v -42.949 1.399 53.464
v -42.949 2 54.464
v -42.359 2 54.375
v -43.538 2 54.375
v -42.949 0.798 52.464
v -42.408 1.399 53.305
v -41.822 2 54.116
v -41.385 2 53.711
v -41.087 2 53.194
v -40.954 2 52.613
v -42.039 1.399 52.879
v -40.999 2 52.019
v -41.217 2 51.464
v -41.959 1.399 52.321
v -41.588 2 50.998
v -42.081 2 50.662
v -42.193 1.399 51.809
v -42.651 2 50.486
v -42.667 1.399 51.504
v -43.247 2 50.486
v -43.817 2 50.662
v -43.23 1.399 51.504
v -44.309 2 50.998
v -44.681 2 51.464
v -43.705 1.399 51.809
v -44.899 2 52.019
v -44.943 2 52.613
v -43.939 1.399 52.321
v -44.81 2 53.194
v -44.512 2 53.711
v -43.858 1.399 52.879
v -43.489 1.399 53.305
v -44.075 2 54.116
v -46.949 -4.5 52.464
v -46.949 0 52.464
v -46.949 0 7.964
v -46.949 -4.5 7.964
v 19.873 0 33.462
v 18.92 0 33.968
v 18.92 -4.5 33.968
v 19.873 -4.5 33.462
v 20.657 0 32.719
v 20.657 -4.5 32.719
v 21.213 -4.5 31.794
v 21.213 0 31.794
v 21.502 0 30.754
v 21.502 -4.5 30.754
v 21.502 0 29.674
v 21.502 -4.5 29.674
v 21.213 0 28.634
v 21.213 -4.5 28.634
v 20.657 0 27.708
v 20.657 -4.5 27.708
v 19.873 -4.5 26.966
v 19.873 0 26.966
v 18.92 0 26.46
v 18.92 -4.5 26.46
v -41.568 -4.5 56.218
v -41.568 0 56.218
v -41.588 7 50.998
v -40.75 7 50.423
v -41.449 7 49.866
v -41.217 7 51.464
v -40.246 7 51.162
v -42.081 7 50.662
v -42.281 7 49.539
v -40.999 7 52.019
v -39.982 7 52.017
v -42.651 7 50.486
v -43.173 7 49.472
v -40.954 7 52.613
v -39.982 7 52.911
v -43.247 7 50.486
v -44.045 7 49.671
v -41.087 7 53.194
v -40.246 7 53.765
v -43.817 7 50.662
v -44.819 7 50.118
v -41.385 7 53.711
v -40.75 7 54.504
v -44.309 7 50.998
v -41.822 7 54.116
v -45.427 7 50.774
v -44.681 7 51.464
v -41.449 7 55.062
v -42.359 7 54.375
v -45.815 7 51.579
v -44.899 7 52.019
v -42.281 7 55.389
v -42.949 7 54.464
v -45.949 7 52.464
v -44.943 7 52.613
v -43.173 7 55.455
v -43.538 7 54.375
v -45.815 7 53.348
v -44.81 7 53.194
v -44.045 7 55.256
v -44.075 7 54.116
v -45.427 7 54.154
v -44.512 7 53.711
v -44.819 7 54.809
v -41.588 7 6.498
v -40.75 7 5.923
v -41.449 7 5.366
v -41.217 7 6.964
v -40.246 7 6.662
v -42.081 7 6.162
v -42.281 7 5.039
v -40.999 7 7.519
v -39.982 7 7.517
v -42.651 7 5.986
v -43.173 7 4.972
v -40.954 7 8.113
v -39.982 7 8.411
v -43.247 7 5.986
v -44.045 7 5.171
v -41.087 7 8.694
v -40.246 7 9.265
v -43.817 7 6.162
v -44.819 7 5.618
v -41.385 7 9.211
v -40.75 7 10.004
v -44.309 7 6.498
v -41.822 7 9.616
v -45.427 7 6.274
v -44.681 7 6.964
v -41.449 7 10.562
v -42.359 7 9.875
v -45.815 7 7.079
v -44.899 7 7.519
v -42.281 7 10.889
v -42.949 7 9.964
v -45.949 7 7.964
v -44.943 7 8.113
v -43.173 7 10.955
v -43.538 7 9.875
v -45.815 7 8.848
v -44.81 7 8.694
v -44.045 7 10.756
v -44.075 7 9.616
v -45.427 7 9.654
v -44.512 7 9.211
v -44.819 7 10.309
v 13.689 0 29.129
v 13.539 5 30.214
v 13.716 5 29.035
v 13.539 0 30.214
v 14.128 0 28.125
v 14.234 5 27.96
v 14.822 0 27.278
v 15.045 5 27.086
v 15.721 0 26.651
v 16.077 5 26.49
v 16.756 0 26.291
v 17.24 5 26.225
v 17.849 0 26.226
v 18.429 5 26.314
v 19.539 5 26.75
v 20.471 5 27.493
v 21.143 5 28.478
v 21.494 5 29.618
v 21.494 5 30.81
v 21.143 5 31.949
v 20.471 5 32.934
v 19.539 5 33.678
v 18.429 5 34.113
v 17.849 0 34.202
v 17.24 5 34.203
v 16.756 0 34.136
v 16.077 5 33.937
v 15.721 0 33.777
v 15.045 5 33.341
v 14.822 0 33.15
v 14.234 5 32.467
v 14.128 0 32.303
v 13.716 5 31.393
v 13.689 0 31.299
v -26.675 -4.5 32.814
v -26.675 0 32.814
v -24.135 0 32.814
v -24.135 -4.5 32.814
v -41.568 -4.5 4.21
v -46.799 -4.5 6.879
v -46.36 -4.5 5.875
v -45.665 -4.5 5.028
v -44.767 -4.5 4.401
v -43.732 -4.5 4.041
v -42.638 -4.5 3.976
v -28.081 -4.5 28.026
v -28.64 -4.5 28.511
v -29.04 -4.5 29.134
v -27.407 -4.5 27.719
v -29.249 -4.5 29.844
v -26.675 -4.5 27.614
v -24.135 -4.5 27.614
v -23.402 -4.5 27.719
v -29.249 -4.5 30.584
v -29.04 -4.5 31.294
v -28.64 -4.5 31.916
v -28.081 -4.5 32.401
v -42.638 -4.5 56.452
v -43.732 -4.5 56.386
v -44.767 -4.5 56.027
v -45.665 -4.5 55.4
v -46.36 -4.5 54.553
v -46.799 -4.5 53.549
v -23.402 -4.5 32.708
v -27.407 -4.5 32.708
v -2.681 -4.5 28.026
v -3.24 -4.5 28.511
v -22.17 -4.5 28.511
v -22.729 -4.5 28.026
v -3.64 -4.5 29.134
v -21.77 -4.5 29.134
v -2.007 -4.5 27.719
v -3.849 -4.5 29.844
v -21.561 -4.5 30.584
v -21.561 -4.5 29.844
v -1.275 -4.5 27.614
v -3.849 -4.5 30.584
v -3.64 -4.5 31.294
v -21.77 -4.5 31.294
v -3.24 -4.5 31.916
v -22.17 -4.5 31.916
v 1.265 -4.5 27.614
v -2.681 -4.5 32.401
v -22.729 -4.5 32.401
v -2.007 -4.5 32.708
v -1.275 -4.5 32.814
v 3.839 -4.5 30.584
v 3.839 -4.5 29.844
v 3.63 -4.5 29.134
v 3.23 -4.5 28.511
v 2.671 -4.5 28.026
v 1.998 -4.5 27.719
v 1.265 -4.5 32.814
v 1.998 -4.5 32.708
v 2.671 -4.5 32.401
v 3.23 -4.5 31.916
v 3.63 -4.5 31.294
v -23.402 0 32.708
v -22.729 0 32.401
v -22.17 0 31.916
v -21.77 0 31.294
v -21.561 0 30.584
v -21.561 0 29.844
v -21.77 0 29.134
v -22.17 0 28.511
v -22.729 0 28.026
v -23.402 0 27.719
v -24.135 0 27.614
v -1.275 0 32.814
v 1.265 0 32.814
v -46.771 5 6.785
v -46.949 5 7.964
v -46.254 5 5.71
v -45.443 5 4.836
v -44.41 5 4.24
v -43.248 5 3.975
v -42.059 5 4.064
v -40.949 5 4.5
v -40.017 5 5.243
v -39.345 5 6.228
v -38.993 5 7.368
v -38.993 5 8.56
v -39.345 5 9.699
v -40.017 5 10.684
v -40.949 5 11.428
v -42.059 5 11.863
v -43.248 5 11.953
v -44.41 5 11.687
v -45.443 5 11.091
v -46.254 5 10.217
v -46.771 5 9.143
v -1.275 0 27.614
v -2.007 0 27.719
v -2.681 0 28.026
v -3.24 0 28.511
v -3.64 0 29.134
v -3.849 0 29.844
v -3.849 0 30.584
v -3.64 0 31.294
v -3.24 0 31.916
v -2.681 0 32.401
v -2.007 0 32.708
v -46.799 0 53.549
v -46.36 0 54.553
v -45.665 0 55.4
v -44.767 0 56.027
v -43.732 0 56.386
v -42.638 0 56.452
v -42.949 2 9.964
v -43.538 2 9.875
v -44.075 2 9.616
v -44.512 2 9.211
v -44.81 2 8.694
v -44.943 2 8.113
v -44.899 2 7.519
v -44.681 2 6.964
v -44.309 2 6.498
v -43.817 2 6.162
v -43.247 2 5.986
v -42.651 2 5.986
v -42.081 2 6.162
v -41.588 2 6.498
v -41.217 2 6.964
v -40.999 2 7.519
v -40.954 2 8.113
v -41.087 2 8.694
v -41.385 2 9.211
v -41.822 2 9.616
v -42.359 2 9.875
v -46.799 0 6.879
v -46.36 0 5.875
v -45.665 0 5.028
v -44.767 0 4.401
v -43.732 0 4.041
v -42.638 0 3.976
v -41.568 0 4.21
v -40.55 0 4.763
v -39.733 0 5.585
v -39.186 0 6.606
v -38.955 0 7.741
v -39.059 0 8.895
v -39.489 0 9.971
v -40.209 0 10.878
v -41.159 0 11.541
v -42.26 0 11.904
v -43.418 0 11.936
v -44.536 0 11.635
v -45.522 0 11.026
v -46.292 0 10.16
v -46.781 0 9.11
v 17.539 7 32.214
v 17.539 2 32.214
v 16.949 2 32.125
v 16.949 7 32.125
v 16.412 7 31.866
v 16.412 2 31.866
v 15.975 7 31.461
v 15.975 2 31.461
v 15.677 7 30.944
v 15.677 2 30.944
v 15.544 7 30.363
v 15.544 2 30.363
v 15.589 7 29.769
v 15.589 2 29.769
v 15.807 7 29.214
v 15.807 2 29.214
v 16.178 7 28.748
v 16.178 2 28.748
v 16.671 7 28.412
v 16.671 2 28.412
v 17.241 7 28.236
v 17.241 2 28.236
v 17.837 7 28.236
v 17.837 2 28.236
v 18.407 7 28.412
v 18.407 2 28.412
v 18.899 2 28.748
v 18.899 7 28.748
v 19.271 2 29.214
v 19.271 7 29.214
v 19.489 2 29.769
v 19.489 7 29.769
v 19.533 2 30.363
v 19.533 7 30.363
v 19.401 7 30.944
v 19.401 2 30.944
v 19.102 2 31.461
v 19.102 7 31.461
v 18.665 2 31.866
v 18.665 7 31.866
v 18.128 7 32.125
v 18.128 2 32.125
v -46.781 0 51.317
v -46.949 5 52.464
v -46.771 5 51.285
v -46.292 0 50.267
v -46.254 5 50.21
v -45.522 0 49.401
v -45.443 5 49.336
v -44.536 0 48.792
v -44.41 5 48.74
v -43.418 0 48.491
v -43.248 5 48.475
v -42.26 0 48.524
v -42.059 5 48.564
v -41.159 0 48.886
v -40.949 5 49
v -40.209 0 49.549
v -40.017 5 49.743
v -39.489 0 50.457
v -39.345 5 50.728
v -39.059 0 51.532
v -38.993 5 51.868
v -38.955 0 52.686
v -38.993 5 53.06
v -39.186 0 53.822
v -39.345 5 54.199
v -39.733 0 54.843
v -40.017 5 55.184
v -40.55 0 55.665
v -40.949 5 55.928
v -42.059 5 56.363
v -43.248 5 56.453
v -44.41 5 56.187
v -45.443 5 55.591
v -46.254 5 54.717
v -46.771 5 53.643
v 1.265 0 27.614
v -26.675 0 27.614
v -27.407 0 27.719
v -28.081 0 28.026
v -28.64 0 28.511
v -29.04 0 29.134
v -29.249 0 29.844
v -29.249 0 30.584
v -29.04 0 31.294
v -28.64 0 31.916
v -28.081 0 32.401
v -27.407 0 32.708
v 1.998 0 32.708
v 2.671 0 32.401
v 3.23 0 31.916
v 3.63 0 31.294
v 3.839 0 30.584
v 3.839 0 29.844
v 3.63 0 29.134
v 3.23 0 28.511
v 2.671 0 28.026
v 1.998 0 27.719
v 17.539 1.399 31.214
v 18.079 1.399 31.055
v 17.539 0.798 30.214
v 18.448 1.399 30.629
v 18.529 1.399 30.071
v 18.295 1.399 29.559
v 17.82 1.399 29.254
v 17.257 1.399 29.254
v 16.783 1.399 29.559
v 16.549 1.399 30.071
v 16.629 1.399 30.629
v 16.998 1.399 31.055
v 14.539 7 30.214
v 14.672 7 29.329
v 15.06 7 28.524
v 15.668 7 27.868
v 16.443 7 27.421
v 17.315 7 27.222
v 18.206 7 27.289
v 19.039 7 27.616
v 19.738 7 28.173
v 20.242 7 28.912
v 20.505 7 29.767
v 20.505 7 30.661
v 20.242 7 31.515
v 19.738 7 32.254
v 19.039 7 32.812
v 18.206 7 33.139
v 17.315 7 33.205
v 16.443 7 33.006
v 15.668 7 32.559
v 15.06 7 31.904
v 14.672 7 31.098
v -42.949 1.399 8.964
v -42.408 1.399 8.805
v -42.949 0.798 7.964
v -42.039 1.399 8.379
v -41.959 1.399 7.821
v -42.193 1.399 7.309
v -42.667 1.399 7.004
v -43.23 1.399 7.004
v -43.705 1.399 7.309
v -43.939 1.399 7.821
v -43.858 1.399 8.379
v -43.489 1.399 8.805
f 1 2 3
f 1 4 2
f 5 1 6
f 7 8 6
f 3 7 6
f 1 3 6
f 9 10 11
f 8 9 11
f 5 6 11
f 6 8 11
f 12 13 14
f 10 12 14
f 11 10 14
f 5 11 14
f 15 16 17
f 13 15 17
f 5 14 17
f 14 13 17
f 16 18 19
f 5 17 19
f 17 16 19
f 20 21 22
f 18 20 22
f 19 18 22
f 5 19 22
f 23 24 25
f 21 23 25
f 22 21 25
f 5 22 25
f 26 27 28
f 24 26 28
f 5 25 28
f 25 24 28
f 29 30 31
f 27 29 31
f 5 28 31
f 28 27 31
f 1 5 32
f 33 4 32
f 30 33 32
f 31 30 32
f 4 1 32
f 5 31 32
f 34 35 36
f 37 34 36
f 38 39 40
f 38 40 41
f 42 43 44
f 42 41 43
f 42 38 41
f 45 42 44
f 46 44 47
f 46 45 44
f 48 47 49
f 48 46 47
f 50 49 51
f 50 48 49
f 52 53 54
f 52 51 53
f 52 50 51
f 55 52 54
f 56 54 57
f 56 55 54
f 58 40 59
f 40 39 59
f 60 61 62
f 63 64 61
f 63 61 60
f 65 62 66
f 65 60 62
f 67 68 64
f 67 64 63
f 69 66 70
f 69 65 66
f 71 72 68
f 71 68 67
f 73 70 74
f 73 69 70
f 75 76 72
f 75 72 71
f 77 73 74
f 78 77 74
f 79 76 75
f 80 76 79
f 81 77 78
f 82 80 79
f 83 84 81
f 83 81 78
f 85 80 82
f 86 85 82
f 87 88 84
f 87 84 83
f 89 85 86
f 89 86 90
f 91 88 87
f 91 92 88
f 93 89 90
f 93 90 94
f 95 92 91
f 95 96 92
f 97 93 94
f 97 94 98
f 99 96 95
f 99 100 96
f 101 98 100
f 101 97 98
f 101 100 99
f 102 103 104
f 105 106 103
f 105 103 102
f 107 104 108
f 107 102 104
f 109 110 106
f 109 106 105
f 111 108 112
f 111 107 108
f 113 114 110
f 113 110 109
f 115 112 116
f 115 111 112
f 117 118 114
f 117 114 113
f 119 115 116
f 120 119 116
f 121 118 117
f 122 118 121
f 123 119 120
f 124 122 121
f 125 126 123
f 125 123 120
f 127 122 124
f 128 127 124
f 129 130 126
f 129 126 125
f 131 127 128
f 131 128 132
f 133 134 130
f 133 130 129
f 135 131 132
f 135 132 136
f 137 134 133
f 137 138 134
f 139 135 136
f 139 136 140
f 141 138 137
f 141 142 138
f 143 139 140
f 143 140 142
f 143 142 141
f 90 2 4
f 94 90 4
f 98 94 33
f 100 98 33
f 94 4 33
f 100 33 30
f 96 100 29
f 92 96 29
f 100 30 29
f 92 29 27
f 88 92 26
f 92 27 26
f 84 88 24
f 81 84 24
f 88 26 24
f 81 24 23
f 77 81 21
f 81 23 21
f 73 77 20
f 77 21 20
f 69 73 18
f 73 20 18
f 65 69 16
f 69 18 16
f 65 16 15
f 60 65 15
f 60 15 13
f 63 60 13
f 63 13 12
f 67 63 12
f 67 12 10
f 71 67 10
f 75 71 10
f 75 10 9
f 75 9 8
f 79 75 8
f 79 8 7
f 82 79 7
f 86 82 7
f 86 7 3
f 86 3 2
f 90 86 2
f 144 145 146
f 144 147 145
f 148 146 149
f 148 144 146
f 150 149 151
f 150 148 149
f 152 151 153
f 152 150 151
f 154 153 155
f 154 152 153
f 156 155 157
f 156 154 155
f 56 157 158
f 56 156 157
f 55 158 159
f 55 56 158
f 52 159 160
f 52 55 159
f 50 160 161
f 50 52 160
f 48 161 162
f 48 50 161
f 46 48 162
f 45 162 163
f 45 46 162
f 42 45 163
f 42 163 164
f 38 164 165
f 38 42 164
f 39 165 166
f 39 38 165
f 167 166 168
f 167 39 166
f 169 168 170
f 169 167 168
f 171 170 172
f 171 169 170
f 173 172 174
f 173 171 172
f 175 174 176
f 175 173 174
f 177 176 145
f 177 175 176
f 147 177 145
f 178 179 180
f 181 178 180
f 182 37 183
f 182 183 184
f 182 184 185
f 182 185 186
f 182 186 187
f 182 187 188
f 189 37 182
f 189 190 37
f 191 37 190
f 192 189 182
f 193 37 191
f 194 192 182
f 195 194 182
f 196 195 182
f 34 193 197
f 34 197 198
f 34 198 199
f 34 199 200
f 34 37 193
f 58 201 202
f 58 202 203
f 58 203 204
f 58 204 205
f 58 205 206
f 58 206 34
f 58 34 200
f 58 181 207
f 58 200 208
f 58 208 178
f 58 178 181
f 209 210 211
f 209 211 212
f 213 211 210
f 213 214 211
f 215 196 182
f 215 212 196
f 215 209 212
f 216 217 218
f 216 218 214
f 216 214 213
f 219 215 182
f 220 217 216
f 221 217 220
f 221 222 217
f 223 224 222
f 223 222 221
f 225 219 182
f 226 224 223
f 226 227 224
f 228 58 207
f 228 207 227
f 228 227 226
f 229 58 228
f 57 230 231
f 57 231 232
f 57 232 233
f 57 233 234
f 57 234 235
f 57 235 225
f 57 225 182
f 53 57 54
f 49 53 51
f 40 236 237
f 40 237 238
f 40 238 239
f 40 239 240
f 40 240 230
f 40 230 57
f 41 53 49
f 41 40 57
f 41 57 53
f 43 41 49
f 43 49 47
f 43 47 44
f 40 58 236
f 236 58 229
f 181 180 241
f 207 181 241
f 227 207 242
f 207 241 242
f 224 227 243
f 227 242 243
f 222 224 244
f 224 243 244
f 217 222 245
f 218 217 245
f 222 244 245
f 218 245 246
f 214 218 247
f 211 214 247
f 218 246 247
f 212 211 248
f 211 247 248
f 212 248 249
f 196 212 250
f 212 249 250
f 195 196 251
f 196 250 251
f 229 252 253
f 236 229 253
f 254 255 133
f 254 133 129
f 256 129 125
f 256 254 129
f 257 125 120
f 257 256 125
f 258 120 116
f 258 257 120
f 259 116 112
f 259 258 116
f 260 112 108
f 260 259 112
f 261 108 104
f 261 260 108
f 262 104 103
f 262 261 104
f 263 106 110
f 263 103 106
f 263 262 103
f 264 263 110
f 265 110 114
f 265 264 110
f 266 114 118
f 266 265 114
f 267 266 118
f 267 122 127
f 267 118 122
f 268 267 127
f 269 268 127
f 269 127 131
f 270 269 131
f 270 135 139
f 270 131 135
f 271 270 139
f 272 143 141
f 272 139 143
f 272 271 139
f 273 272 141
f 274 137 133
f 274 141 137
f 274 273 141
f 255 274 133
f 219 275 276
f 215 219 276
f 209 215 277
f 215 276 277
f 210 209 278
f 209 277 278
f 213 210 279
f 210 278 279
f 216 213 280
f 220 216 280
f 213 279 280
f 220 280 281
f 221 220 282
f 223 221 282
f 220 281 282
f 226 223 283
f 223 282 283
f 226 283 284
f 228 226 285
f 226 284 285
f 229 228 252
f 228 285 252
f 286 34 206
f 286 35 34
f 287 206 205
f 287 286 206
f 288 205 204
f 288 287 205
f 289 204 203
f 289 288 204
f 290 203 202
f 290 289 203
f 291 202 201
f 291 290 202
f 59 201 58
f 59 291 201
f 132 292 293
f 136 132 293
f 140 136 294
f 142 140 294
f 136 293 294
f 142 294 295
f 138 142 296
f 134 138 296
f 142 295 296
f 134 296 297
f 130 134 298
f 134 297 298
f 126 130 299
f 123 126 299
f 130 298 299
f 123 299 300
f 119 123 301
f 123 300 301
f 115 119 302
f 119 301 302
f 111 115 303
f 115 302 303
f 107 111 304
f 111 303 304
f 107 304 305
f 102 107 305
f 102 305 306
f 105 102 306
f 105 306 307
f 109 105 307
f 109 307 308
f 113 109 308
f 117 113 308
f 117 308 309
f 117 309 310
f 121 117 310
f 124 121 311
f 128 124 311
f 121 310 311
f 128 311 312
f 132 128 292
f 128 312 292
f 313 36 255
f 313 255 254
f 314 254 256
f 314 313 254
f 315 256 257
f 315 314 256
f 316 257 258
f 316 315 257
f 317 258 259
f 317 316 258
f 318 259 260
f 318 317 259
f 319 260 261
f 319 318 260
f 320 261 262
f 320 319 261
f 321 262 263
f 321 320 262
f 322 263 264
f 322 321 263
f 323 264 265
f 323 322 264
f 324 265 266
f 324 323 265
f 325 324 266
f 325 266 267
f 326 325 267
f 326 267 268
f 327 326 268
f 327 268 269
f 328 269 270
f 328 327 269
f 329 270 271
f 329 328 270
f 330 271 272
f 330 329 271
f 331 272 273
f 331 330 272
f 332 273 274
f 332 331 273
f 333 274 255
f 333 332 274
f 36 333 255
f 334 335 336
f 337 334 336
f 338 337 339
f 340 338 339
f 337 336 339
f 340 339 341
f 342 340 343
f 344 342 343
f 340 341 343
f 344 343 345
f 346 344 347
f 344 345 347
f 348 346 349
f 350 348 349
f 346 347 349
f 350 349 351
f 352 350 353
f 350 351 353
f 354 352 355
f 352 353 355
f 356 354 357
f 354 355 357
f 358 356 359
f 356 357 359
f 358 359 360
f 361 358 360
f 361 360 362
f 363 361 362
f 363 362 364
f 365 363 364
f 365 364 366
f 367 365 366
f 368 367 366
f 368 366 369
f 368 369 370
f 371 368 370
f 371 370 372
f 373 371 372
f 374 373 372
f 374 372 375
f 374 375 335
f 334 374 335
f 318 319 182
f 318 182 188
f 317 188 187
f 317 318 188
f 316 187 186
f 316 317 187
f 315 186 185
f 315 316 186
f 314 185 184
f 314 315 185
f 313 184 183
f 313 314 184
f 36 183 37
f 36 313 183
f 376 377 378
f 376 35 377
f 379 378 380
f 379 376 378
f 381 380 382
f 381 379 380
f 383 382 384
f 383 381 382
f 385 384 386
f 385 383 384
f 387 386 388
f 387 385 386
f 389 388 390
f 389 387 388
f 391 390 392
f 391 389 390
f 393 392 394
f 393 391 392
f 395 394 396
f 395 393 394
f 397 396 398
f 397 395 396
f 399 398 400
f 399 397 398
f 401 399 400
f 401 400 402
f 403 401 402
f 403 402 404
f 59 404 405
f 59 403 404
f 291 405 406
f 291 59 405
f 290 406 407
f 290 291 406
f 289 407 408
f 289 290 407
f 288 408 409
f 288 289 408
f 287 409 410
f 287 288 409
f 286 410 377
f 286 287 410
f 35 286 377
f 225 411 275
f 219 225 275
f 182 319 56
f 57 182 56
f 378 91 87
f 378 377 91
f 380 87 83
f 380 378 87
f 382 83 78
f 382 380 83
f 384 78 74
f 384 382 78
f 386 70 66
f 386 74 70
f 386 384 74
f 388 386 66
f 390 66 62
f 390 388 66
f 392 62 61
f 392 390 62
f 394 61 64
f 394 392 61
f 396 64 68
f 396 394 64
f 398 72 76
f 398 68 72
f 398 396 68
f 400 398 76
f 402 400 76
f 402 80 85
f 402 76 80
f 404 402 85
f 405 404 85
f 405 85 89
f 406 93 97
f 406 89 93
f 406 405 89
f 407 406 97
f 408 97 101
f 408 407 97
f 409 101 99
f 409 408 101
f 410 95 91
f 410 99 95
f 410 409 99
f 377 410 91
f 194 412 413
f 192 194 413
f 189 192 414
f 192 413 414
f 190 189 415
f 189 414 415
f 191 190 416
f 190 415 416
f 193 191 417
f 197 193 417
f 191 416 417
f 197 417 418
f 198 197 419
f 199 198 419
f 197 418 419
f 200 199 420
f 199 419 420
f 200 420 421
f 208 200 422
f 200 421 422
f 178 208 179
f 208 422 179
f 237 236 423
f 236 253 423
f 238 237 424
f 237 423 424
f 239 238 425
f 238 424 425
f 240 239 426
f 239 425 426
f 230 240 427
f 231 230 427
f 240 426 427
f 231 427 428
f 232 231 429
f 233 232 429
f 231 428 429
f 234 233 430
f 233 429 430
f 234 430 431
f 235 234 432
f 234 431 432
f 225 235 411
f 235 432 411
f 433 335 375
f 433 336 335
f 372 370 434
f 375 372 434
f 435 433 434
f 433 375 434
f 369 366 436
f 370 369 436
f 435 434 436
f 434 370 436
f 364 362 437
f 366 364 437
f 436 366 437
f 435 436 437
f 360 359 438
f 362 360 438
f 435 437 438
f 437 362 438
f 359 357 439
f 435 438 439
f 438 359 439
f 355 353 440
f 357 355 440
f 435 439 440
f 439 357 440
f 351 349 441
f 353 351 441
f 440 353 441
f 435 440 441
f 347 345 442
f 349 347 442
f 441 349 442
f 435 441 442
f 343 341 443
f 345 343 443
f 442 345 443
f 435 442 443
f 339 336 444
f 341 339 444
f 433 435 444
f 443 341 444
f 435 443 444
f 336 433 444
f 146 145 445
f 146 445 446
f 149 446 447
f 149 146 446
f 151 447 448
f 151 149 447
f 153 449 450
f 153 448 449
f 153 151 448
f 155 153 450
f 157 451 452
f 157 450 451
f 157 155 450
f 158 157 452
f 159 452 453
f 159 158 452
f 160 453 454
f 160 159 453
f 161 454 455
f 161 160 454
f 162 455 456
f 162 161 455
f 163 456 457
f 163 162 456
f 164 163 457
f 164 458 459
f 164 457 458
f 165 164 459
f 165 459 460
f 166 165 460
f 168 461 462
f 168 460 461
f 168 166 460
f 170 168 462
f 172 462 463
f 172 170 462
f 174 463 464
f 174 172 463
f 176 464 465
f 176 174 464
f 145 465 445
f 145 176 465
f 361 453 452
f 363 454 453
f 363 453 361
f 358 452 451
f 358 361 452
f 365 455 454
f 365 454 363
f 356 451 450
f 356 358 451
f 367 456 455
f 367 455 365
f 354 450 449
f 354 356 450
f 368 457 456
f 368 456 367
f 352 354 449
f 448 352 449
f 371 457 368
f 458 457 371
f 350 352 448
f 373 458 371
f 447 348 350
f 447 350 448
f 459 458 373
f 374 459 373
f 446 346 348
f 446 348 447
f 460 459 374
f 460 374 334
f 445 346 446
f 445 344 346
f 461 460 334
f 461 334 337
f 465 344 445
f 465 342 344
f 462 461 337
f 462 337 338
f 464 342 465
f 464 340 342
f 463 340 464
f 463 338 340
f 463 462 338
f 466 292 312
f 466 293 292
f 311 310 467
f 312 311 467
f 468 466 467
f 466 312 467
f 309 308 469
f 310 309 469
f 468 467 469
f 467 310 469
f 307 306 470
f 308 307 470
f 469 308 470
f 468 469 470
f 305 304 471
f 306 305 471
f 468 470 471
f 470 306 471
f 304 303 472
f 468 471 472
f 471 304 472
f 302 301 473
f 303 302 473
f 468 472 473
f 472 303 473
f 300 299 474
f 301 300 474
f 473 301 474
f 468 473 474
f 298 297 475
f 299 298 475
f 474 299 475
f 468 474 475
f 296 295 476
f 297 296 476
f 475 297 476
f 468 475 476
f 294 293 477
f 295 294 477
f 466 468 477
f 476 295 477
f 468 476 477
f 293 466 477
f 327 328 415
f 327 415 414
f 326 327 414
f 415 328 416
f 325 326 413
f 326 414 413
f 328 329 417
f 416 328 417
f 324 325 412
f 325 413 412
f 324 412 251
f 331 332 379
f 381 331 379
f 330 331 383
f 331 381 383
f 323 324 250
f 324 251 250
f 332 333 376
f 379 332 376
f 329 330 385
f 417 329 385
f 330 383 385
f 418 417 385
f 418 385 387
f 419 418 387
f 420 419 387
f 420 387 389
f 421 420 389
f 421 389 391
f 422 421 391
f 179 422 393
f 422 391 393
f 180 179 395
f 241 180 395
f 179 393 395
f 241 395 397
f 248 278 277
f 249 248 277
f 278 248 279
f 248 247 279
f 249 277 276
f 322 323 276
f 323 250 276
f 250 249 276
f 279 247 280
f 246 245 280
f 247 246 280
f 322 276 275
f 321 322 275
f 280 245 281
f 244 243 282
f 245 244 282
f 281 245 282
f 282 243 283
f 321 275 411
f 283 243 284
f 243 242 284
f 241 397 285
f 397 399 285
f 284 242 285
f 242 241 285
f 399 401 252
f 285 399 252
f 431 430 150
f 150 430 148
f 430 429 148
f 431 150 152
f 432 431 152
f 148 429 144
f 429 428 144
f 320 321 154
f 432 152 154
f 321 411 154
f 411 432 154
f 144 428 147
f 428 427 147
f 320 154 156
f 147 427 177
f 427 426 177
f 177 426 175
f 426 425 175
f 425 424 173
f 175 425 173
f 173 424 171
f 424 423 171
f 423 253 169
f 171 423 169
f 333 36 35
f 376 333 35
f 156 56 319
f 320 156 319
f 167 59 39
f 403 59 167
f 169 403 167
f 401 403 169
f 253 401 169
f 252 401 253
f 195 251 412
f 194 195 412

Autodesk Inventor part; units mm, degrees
ref_plane "YZ Plane" through (0, 0, 0) normal (1, 0, 0) x (0, 1, 0)
ref_plane "XZ Plane" through (0, 0, 0) normal (0, 1, 0) x (-1, 0, 0)
ref_plane "XY Plane" through (0, 0, 0) normal (0, 0, 1) x (1, 0, 0)
sketch "Connector Hole Layout" plane through (0, 0, 0) normal (0, 1, 0) x (-1, 0, 0)
  circle A0 centre (42.948752, 7.963756) radius 1.6 construction
  circle A1 centre (-17.538767, 30.213756) radius 1.6 construction
  circle A2 centre (42.948752, 52.463756) radius 1.6 construction
  line L0 (42.948752, 7.963756) -> (42.948752, 52.463756) construction
  line L1 (41.447122, 51.91139) -> (-16.037138, 30.766122) construction
  point P0 (42.948752, 30.213756)
  dimension "d0" = 3.2
  dimension "d22" = 44.5
  dimension "d23" = 61.25
sketch "Sketch8" plane through (0, 0, 0) normal (0, 1, 0) x (-1, 0, 0)
  circle A0 centre (42.948752, 7.963756) radius 1.6 construction
  circle A1 centre (42.948752, 52.463756) radius 1.6 construction
  circle A2 centre (-17.538767, 30.213756) radius 1.6 construction
  circle A3 centre (42.948752, 7.963756) radius 4
  point P0 (0, 0)
  dimension "d51" = 8
sketch "Sketch8 outline for Extrusion5" plane through (0, 0, 0) normal (0, 1, 0) x (-1, 0, 0)
  circle A0 centre (42.948752, 7.963756) radius 4
extrude "Extrusion5" add sketch "Sketch8 outline for Extrusion5" along normal blind 7
sketch "Sketch9" plane through (-42.948752, 7, 7.963756) normal (0, 1, 0) x (1, 0, 0)
  point P0 (42.948752, 7.963756)
  point P1 (0, 0)
hole "Hole2" at (-42.948752, 7, 7.963756) direction (0, -1, 0) diameter 4 depth 5 tip angle 118
chamfer "Chamfer3" distance 1 distance2 2 1 edges at (-38.9488, 7, 7.9638) measured on face at (-46.2385, 7, 7.5643)
pattern_sketch "Sketch Driven Pattern1" from (-42.948752, 0, 7.963756) copies at (-42.948752, 0, 52.463756) at (17.538767, 0, 30.213756)
sketch "Sketch10" plane through (-42.948752, 0, 52.463756) normal (0, -1, 0) x (1, 0, 0)
  circle A0 centre (0, 0) radius 4
  line L0 (1.380915, 3.754074) -> (61.868435, -18.495926)
  circle A1 centre (60.487519, -22.25) radius 4
  line L1 (61.868435, -26.004074) -> (1.380915, -48.254074)
  circle A2 centre (0, -44.5) radius 4
  line L2 (-4, -44.5) -> (-4, 0)
  circle A3 centre (0, 0) radius 4
  circle A4 centre (0, -44.5) radius 4
  point P0 (42.948752, -52.463756)
sketch "Sketch10 outline for Extrusion6" plane through (-42.948752, 0, 52.463756) normal (0, -1, 0) x (1, 0, 0)
  line L0 (-4, 0) -> (-4, -44.5)
  arc A0 (1.380915, 3.754074) -> (-4, 0) centre (0, 0) ccw
  line L1 (61.868435, -18.495926) -> (1.380915, 3.754074)
  arc A1 (61.868435, -26.004074) -> (61.868435, -18.495926) centre (60.487519, -22.25) ccw
  line L2 (1.380915, -48.254074) -> (61.868435, -26.004074)
  arc A2 (-4, -44.5) -> (1.380915, -48.254074) centre (0, -44.5) ccw
extrude "Extrusion6" add sketch "Sketch10 outline for Extrusion6" along normal blind 4.5
sketch "Sketch11" plane through (-42.948752, 0, 52.463756) normal (0, 1, 0) x (1, 0, 0)
  line L0 (-4, 48.5) -> (64.487519, 48.5) construction
  line L1 (64.487519, 48.5) -> (64.487519, -4) construction
  line L2 (64.487519, -4) -> (-4, -4) construction
  line L3 (-4, -4) -> (-4, 48.5) construction
  circle A0 centre (60.487519, 22.25) radius 4 construction
  circle A1 centre (0, 0) radius 4 construction
  circle A2 centre (0, 44.5) radius 4 construction
  line L4 (30.24376, 48.5) -> (30.24376, -4) construction
  line L5 (-4, 22.25) -> (64.487519, 22.25) construction
  line L6 (16.27376, 22.25) -> (18.81376, 22.25) construction
  line L7 (16.27376, 19.65) -> (18.81376, 19.65)
  line L8 (18.81376, 24.85) -> (16.27376, 24.85)
  arc A3 (16.27376, 24.85) -> (16.27376, 19.65) centre (16.27376, 22.25) ccw
  arc A4 (18.81376, 19.65) -> (18.81376, 24.85) centre (18.81376, 22.25) ccw
  line L9 (44.21376, 19.65) -> (41.67376, 19.65)
  line L10 (41.67376, 24.85) -> (44.21376, 24.85)
  arc A5 (44.21376, 19.65) -> (44.21376, 24.85) centre (44.21376, 22.25) ccw
  arc A6 (41.67376, 24.85) -> (41.67376, 19.65) centre (41.67376, 22.25) ccw
  point P0 (42.948752, 52.463756)
  point P1 (30.24376, 22.25)
  point P2 (30.24376, 22.25)
  point P3 (17.54376, 22.25)
  point P4 (17.54376, 24.85)
  point P5 (17.54376, 19.65)
  dimension "d66" = 11.43
  dimension "d67" = 13.97
  dimension "d68" = 5.2
sketch "Sketch11 outline for Extrusion7" plane through (-42.948752, 0, 52.463756) normal (0, 1, 0) x (1, 0, 0)
  arc A0 (44.21376, 19.65) -> (44.21376, 24.85) centre (44.21376, 22.25) ccw
  line L0 (41.67376, 19.65) -> (44.21376, 19.65)
  arc A1 (41.67376, 24.85) -> (41.67376, 19.65) centre (41.67376, 22.25) ccw
  line L1 (44.21376, 24.85) -> (41.67376, 24.85)
  line L2 (16.27376, 19.65) -> (18.81376, 19.65)
  arc A2 (16.27376, 24.85) -> (16.27376, 19.65) centre (16.27376, 22.25) ccw
  line L3 (18.81376, 24.85) -> (16.27376, 24.85)
  arc A3 (18.81376, 19.65) -> (18.81376, 24.85) centre (18.81376, 22.25) ccw
extrude "Extrusion7" cut sketch "Sketch11 outline for Extrusion7" against normal blind 10
properties part number "db-25_standoffs_plate_t-slot-2inx1in"
